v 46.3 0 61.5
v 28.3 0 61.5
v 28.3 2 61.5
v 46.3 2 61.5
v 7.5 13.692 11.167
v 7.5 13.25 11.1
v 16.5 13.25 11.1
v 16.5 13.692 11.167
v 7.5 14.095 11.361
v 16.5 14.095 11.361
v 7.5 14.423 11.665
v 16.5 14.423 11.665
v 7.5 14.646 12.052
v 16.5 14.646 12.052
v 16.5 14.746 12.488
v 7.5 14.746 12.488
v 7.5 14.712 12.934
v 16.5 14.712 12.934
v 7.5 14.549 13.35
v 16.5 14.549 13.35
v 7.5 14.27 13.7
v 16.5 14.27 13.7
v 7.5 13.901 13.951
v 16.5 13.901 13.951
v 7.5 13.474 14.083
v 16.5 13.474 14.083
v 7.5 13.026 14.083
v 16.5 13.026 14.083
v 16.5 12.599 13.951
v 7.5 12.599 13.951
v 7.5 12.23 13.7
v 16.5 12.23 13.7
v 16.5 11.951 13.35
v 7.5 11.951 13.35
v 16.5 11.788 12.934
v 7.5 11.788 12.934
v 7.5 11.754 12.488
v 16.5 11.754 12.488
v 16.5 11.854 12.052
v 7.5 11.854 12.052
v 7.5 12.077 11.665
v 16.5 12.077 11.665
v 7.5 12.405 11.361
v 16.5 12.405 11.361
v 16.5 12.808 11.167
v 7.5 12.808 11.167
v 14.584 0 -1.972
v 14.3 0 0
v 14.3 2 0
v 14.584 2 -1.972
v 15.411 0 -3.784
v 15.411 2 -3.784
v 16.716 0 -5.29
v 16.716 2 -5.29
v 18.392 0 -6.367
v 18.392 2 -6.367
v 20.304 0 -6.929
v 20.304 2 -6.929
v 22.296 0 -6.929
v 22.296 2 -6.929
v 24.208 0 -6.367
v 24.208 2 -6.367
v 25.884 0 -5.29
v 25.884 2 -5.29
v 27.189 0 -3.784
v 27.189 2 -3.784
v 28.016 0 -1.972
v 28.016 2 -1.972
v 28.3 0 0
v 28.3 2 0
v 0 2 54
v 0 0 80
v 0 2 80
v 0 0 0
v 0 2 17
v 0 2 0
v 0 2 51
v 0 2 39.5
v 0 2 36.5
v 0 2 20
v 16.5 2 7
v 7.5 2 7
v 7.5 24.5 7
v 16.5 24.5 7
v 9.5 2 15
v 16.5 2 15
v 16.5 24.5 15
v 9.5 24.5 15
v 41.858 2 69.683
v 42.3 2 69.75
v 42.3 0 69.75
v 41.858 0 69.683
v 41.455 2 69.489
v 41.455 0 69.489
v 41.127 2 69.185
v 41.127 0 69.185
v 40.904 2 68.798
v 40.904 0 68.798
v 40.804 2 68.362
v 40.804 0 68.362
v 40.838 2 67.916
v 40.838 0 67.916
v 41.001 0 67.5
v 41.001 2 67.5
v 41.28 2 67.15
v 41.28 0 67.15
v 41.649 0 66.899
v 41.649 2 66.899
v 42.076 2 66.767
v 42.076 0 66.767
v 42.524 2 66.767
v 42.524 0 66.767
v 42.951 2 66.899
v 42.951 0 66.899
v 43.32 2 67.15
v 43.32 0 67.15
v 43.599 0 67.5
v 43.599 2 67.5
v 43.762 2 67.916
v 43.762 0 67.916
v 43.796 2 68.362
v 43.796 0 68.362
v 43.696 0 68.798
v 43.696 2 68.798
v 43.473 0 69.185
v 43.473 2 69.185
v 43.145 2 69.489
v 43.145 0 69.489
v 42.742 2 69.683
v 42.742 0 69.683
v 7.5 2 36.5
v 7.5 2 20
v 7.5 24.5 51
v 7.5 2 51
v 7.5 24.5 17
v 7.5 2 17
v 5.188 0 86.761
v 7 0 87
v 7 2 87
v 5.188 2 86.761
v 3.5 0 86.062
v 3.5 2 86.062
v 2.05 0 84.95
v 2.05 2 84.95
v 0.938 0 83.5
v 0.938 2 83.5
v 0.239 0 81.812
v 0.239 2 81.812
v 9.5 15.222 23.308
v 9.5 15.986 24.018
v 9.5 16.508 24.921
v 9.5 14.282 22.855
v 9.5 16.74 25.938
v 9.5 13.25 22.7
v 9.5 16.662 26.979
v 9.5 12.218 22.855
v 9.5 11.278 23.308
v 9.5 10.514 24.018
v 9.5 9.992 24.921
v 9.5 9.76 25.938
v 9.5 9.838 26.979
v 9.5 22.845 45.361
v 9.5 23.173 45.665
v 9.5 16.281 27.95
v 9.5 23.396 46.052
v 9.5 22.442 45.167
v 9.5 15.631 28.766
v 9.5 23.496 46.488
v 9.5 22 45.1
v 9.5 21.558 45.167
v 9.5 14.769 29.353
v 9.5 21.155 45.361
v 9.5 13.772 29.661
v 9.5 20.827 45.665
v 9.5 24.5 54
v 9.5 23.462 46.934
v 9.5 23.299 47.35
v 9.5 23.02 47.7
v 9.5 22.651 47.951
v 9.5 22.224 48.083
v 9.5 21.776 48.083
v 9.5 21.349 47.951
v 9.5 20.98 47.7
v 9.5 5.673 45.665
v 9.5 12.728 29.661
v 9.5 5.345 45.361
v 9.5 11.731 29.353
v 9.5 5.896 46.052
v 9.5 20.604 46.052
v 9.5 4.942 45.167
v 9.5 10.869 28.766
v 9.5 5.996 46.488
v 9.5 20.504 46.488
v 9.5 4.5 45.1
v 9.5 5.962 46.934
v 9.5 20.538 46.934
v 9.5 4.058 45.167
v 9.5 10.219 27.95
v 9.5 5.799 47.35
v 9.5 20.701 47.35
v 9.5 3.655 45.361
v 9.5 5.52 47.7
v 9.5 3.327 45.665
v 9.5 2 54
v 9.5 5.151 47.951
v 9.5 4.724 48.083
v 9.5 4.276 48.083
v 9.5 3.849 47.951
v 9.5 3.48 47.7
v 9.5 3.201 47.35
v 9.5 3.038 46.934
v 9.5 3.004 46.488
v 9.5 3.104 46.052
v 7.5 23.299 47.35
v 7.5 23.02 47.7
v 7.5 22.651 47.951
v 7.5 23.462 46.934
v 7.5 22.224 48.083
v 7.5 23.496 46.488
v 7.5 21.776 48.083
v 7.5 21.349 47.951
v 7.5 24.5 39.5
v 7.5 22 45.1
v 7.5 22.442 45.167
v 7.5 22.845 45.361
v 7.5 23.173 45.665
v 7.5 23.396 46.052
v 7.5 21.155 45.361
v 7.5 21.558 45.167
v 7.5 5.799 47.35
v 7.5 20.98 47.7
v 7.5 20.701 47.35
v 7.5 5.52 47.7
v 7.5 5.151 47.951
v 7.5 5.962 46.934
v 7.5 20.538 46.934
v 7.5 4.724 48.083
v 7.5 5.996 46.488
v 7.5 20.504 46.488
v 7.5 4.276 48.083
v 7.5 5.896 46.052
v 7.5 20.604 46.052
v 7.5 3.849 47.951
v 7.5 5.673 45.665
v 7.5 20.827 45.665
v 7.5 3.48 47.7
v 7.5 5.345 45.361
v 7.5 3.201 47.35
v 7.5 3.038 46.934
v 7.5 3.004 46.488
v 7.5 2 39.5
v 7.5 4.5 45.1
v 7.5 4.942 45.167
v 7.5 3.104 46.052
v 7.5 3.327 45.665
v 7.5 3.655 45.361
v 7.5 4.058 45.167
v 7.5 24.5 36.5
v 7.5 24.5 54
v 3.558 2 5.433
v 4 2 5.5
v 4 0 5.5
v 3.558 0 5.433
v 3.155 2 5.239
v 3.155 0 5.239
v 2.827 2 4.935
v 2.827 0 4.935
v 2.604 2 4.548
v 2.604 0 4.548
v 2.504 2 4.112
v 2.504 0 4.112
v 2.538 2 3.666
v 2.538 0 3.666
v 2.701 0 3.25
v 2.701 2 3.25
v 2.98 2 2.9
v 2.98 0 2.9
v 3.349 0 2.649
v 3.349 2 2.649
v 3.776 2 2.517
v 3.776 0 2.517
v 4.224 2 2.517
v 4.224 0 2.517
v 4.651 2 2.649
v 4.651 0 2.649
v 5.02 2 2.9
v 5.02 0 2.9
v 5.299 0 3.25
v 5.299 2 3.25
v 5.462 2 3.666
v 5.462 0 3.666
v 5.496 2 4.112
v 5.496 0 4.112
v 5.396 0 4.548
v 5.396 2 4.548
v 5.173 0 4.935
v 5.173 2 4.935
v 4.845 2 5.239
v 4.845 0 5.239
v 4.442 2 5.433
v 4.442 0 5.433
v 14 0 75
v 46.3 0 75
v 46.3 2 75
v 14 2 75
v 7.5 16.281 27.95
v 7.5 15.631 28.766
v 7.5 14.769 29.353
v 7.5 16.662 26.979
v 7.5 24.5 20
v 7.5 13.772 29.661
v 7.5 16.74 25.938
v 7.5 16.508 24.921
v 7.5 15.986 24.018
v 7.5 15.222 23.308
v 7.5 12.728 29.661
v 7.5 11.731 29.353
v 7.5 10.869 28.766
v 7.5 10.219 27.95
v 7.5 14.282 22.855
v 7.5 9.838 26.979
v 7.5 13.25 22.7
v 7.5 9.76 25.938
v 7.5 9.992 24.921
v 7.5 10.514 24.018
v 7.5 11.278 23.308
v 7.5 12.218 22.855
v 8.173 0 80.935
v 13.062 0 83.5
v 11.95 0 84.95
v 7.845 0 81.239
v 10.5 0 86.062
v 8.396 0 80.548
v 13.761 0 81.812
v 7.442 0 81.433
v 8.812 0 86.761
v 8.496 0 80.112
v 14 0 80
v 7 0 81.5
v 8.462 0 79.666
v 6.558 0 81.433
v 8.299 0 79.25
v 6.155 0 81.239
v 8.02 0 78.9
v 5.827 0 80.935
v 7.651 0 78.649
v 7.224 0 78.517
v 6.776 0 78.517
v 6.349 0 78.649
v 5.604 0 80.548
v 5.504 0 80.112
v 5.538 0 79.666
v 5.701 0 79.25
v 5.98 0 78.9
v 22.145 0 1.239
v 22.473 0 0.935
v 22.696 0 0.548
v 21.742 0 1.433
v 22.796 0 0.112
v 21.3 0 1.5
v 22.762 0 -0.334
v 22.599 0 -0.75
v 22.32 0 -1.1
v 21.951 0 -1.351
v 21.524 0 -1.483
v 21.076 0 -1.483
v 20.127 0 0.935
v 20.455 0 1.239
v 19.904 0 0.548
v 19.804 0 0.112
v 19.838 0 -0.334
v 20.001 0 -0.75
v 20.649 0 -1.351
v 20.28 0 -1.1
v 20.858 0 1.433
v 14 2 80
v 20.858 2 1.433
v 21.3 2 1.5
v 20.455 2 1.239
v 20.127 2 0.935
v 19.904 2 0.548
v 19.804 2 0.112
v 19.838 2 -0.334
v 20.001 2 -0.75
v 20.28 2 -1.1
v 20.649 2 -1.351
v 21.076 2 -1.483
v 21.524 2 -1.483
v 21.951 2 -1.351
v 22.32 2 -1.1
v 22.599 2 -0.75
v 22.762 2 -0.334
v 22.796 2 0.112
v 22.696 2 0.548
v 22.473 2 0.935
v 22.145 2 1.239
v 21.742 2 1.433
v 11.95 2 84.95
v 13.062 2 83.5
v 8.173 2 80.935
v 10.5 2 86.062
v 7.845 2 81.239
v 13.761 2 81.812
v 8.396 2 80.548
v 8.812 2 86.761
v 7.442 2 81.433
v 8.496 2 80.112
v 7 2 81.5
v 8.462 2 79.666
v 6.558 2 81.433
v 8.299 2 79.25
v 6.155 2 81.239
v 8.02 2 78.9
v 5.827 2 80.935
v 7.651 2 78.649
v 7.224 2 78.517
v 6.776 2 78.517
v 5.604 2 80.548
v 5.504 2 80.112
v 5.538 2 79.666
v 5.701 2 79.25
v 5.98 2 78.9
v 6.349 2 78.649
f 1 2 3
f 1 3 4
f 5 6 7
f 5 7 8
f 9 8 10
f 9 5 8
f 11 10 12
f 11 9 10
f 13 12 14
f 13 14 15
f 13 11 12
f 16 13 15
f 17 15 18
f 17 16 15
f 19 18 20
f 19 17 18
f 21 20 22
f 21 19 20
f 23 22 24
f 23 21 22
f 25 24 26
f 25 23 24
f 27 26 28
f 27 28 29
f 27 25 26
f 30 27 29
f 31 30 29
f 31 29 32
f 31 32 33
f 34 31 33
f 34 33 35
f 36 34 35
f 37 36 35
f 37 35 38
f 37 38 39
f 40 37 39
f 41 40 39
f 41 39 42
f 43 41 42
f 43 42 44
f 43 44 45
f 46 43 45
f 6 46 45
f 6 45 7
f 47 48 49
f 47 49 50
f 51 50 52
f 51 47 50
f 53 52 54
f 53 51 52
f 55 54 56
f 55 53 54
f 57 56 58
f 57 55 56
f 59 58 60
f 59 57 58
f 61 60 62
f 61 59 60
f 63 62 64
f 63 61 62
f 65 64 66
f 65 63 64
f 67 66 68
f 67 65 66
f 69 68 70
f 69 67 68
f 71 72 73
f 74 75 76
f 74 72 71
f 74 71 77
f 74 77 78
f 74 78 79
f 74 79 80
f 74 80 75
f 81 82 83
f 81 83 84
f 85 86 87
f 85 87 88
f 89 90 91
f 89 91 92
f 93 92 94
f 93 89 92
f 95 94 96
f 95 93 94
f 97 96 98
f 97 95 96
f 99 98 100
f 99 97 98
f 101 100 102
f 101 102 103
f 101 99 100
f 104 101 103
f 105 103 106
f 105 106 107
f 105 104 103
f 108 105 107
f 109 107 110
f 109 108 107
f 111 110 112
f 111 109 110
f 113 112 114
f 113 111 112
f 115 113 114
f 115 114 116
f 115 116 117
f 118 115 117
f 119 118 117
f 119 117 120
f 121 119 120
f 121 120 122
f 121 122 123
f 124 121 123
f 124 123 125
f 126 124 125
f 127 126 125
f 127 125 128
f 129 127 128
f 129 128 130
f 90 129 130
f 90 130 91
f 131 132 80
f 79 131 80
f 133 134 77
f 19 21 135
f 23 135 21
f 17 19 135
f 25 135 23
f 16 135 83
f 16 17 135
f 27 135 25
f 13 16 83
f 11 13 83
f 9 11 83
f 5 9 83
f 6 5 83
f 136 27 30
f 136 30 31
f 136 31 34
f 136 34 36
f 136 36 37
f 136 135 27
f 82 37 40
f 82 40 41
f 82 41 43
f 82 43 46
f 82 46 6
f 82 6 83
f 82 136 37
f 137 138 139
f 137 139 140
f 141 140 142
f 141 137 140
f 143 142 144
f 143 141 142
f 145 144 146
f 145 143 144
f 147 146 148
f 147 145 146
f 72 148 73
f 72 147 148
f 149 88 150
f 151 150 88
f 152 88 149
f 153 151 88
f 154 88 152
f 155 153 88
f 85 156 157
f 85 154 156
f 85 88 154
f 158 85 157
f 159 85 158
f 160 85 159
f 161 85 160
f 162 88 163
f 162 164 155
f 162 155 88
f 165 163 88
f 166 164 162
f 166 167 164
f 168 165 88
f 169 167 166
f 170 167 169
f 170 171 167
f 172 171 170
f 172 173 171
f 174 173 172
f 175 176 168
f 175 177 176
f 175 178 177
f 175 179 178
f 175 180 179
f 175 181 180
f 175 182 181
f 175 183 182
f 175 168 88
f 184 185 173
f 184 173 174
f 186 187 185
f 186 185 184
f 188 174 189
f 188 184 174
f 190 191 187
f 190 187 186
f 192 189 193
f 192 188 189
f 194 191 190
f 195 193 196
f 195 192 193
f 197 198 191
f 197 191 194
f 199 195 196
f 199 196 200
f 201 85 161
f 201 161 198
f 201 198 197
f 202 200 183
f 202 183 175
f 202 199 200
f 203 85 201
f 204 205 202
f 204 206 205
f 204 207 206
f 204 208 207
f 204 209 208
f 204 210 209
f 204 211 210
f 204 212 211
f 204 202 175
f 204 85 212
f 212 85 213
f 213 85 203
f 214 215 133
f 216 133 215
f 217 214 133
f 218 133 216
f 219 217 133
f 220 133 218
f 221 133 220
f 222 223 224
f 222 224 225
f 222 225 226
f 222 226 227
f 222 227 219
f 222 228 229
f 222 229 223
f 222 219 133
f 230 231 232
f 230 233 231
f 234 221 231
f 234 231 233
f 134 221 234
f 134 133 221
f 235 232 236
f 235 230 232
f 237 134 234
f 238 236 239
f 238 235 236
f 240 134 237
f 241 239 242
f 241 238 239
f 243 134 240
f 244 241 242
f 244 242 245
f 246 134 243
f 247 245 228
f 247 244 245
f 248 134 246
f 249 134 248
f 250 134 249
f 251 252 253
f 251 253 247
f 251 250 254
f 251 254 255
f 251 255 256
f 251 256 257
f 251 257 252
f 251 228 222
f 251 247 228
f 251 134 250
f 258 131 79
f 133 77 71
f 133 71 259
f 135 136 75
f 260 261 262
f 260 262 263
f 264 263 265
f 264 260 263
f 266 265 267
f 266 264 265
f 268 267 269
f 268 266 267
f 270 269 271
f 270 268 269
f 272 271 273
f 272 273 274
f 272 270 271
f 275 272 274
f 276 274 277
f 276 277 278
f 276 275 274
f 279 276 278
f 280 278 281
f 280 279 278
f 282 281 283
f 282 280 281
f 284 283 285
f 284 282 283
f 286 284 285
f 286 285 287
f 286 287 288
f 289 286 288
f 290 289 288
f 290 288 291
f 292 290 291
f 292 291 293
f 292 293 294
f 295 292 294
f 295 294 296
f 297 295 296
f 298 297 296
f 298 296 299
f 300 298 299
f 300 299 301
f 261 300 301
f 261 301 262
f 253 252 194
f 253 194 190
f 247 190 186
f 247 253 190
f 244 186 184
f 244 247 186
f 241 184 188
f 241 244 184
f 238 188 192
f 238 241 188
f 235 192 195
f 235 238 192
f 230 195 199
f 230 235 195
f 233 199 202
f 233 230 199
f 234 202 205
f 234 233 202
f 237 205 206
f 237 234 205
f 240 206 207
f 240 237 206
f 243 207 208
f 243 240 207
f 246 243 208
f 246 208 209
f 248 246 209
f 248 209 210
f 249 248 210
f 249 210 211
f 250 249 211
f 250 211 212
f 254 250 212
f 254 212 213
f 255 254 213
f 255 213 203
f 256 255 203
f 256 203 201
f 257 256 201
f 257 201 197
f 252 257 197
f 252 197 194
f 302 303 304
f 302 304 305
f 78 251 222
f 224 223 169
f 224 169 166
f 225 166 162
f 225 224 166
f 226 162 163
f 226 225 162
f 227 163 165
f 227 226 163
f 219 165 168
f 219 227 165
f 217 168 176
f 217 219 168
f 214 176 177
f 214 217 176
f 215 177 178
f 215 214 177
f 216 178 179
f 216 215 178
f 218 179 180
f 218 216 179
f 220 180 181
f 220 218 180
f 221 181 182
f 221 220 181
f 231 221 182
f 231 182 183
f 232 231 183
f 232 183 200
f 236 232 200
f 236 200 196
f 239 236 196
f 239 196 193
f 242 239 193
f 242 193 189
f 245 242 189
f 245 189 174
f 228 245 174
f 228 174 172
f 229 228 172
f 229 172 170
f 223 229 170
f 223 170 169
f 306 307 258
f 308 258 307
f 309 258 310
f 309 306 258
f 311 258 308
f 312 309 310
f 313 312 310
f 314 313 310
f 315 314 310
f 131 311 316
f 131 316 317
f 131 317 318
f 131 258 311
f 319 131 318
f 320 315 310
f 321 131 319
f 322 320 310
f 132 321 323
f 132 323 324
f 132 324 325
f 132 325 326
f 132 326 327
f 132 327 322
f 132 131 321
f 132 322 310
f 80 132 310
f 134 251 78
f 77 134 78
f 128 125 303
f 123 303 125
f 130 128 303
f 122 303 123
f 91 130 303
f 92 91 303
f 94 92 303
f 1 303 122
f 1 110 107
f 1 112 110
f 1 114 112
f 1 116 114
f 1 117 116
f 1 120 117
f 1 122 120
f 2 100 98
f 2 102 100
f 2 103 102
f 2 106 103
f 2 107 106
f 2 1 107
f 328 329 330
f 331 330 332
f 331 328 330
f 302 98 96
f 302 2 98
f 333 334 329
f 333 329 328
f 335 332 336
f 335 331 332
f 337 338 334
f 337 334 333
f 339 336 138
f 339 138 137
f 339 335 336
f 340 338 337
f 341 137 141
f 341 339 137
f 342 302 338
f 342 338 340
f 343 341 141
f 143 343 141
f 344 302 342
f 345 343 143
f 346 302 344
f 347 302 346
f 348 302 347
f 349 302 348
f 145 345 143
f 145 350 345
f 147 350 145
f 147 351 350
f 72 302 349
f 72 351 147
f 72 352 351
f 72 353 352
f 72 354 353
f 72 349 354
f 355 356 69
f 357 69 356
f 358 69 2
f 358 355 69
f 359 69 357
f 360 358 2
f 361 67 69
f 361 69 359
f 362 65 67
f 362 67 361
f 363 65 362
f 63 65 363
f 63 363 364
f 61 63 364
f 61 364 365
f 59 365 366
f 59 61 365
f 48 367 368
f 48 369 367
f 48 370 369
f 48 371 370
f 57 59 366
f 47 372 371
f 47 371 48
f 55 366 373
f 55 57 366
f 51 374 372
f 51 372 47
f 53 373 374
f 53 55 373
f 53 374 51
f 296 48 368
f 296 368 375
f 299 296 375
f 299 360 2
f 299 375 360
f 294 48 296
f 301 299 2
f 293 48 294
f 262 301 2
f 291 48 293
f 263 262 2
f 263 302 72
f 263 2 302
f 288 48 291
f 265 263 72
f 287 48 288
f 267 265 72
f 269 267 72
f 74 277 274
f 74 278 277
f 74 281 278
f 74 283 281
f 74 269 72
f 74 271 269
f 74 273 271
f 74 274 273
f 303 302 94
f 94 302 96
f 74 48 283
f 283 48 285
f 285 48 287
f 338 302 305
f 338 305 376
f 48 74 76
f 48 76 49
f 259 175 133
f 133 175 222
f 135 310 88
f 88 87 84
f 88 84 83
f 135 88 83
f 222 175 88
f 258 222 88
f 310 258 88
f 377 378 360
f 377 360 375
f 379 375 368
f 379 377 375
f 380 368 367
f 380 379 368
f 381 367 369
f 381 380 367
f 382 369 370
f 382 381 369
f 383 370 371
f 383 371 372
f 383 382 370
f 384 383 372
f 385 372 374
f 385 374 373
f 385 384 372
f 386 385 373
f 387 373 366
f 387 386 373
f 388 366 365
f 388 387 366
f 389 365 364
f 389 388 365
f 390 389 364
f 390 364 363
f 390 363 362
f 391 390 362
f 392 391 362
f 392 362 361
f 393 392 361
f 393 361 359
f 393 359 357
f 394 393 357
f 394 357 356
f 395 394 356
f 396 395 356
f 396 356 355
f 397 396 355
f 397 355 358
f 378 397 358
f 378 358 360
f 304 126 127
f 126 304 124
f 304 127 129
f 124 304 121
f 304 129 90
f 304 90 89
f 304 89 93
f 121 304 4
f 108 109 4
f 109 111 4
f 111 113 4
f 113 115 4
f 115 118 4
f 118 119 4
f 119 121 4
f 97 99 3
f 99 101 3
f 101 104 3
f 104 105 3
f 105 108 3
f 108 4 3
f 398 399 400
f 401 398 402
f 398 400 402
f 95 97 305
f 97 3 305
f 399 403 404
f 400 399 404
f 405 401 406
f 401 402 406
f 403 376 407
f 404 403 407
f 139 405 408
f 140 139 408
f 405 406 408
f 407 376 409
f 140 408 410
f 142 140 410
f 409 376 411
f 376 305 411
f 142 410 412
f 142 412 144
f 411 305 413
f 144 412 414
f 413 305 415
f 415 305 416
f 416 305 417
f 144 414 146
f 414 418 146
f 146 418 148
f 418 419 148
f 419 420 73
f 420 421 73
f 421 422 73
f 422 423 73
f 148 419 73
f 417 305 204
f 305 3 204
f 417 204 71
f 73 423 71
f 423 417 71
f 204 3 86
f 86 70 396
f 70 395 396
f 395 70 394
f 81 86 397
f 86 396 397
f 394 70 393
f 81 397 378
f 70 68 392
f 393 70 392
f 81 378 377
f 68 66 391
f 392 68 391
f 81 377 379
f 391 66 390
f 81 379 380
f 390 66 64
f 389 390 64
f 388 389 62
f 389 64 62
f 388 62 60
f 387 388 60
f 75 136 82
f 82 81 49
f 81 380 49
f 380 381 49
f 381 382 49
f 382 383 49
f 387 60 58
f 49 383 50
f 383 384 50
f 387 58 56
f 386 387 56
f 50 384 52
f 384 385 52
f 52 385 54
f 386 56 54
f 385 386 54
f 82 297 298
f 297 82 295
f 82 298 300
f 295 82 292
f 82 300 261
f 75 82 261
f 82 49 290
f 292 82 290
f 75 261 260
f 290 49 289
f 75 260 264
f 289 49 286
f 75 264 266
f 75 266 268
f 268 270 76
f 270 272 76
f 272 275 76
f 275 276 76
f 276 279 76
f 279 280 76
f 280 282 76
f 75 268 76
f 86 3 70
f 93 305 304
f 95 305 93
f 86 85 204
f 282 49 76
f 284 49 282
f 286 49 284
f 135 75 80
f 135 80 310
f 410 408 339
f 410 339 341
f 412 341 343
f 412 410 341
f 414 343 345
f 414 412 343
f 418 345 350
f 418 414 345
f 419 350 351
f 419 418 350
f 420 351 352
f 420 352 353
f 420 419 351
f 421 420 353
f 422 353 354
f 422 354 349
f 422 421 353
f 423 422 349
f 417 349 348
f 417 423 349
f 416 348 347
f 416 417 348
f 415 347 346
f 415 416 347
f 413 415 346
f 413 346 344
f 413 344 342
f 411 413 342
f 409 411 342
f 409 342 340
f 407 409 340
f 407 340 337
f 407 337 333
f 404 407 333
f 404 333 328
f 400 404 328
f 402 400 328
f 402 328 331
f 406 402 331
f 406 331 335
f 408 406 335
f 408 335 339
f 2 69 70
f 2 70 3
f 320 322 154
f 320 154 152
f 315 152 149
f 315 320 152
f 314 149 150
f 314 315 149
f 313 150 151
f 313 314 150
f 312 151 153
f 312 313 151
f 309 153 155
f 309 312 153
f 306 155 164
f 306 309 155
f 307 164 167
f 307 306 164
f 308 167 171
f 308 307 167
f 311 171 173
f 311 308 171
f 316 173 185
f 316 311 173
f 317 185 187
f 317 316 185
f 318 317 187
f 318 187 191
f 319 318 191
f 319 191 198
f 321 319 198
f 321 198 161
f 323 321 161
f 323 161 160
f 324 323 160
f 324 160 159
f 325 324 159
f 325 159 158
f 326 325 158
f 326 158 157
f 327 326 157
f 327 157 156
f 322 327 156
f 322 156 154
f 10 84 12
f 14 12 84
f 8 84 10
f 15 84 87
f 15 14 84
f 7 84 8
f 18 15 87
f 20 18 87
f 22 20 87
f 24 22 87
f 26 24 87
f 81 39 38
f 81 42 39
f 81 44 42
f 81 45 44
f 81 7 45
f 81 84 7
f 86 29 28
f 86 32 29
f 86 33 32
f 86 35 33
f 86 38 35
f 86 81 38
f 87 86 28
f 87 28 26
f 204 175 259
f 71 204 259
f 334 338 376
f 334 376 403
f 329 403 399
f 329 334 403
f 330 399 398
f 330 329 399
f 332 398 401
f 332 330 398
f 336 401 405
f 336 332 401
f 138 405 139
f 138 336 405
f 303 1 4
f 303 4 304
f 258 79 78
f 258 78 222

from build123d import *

# Parameters (mm, degrees)
BOSS_EXTRUDE3_DEPTH = 2
BOSS_EXTRUDE6_DEPTH = 22.5
SKETCH10_R          = 1.5
SKETCH10_R_2        = 3.5
CUT_EXTRUDE3_DEPTH  = 99.360002033
RIB6_START          = -3
RIB6_DEPTH          = 3
RIB7_START          = -1.5
RIB7_DEPTH          = 3
RIB8_DEPTH          = 3
SKETCH22_R          = 1.5
CUT_EXTRUDE5_DEPTH  = 102.088772868
SKETCH23_R          = 1.5
CUT_EXTRUDE6_DEPTH  = 102.088772868
SKETCH24_R          = 1.5
CUT_EXTRUDE7_DEPTH  = 10
SKETCH25_R          = 1.5
CUT_EXTRUDE8_DEPTH  = 10


# Read off the part's stored shape, not the designer's step: Rib6, Rib7, Rib8
with BuildPart() as part:
    # vlak basis → Boss-Extrude3 (new body)
    with BuildSketch(Plane(origin=(0, 0, 0), x_dir=(1, 0, 0), z_dir=(0, 1, 0))):
        with BuildLine():
            Line((-46.3, -61.5), (-46.3, -75))
            Line((-46.3, -75), (-14, -75))
            Line((-14, -75), (-14, -80))
            ThreePointArc((-14, -80), (-11.949747468, -84.949747468), (-7, -87))
            ThreePointArc((-7, -87), (-2.050252532, -84.949747468), (0, -80))
            Line((0, -80), (0, 0))
            Line((0, 0), (-14.3, 0))
            ThreePointArc((-14.3, 0), (-21.3, 7), (-28.3, 0))
            Line((-28.3, 0), (-28.3, -61.5))
            Line((-28.3, -61.5), (-46.3, -61.5))
        make_face()
    extrude(amount=BOSS_EXTRUDE3_DEPTH)

    # Sketch8 → Boss-Extrude6 (add)
    with BuildSketch(Plane(origin=(0, 2, 0), x_dir=(1, 0, 0), z_dir=(0, 1, 0))):
        Polygon((-16.5, -7), (-16.5, -15), (-9.5, -15), (-9.5, -54), (-7.5, -54), (-7.5, -7), align=None)
    extrude(amount=BOSS_EXTRUDE6_DEPTH)

    # Sketch10 → Cut-Extrude3 (cut, through all)
    with BuildSketch(Plane(origin=(-7.5, 0, 0), x_dir=(0, 0, -1), z_dir=(1, 0, 0))):
        with Locations((-46.6, 22)):
            Circle(SKETCH10_R)
        with Locations((-46.6, 4.5)):
            Circle(SKETCH10_R)
        with Locations((-26.2, 13.25)):
            Circle(SKETCH10_R_2)
        with Locations((-12.6, 13.25)):
            Circle(SKETCH10_R)
    extrude(amount=-CUT_EXTRUDE3_DEPTH, mode=Mode.SUBTRACT)

    # Rib6 outline → Rib6 (add)
    with BuildSketch(Plane.XY.offset(54).offset(RIB6_START)):
        Polygon((-7.5, 2), (0, 2), (-7.5, 24.5), align=None)
    extrude(amount=RIB6_DEPTH)

    # Rib7 outline → Rib7 (add)
    with BuildSketch(Plane.XY.offset(38).offset(RIB7_START)):
        Polygon((-7.5, 2), (0, 2), (-7.5, 24.5), align=None)
    extrude(amount=RIB7_DEPTH)

    # Rib8 outline → Rib8 (add)
    with BuildSketch(Plane.XY.offset(17)):
        Polygon((-7.5, 2), (0, 2), (-7.5, 24.5), align=None)
    extrude(amount=RIB8_DEPTH)

    # Sketch22 → Cut-Extrude5 (cut, through all)
    with BuildSketch(Plane(origin=(0, 2, 0), x_dir=(1, 0, 0), z_dir=(0, 1, 0))):
        with Locations(Location((-21.3, 0, 0), (0, 0, 270))):
            Circle(SKETCH22_R)
    extrude(amount=-CUT_EXTRUDE5_DEPTH, mode=Mode.SUBTRACT)

    # Sketch23 → Cut-Extrude6 (cut, through all)
    with BuildSketch(Plane(origin=(0, 2, 0), x_dir=(1, 0, 0), z_dir=(0, 1, 0))):
        with Locations(Location((-7, -80, 0), (0, 0, 270))):
            Circle(SKETCH23_R)
    extrude(amount=-CUT_EXTRUDE6_DEPTH, mode=Mode.SUBTRACT)

    # Sketch24 → Cut-Extrude7 (cut)
    with BuildSketch(Plane(origin=(0, 2, 0), x_dir=(1, 0, 0), z_dir=(0, 1, 0))):
        with Locations(Location((-42.3, -68.25, 0), (0, 0, 270))):
            Circle(SKETCH24_R)
    extrude(amount=-CUT_EXTRUDE7_DEPTH, mode=Mode.SUBTRACT)

    # Sketch25 → Cut-Extrude8 (cut)
    with BuildSketch(Plane(origin=(0, 2, 0), x_dir=(1, 0, 0), z_dir=(0, 1, 0))):
        with Locations(Location((-4, -4, 0), (0, 0, 270))):
            Circle(SKETCH25_R)
    extrude(amount=-CUT_EXTRUDE8_DEPTH, mode=Mode.SUBTRACT)


with BuildPart() as body_2:
    # Mirror1: mirrored copy
    add(part.part.mirror(Plane(origin=(0, 2, 80), x_dir=(0, 0, 1), z_dir=(-1, 0, 0))))


solid = body_2.part
